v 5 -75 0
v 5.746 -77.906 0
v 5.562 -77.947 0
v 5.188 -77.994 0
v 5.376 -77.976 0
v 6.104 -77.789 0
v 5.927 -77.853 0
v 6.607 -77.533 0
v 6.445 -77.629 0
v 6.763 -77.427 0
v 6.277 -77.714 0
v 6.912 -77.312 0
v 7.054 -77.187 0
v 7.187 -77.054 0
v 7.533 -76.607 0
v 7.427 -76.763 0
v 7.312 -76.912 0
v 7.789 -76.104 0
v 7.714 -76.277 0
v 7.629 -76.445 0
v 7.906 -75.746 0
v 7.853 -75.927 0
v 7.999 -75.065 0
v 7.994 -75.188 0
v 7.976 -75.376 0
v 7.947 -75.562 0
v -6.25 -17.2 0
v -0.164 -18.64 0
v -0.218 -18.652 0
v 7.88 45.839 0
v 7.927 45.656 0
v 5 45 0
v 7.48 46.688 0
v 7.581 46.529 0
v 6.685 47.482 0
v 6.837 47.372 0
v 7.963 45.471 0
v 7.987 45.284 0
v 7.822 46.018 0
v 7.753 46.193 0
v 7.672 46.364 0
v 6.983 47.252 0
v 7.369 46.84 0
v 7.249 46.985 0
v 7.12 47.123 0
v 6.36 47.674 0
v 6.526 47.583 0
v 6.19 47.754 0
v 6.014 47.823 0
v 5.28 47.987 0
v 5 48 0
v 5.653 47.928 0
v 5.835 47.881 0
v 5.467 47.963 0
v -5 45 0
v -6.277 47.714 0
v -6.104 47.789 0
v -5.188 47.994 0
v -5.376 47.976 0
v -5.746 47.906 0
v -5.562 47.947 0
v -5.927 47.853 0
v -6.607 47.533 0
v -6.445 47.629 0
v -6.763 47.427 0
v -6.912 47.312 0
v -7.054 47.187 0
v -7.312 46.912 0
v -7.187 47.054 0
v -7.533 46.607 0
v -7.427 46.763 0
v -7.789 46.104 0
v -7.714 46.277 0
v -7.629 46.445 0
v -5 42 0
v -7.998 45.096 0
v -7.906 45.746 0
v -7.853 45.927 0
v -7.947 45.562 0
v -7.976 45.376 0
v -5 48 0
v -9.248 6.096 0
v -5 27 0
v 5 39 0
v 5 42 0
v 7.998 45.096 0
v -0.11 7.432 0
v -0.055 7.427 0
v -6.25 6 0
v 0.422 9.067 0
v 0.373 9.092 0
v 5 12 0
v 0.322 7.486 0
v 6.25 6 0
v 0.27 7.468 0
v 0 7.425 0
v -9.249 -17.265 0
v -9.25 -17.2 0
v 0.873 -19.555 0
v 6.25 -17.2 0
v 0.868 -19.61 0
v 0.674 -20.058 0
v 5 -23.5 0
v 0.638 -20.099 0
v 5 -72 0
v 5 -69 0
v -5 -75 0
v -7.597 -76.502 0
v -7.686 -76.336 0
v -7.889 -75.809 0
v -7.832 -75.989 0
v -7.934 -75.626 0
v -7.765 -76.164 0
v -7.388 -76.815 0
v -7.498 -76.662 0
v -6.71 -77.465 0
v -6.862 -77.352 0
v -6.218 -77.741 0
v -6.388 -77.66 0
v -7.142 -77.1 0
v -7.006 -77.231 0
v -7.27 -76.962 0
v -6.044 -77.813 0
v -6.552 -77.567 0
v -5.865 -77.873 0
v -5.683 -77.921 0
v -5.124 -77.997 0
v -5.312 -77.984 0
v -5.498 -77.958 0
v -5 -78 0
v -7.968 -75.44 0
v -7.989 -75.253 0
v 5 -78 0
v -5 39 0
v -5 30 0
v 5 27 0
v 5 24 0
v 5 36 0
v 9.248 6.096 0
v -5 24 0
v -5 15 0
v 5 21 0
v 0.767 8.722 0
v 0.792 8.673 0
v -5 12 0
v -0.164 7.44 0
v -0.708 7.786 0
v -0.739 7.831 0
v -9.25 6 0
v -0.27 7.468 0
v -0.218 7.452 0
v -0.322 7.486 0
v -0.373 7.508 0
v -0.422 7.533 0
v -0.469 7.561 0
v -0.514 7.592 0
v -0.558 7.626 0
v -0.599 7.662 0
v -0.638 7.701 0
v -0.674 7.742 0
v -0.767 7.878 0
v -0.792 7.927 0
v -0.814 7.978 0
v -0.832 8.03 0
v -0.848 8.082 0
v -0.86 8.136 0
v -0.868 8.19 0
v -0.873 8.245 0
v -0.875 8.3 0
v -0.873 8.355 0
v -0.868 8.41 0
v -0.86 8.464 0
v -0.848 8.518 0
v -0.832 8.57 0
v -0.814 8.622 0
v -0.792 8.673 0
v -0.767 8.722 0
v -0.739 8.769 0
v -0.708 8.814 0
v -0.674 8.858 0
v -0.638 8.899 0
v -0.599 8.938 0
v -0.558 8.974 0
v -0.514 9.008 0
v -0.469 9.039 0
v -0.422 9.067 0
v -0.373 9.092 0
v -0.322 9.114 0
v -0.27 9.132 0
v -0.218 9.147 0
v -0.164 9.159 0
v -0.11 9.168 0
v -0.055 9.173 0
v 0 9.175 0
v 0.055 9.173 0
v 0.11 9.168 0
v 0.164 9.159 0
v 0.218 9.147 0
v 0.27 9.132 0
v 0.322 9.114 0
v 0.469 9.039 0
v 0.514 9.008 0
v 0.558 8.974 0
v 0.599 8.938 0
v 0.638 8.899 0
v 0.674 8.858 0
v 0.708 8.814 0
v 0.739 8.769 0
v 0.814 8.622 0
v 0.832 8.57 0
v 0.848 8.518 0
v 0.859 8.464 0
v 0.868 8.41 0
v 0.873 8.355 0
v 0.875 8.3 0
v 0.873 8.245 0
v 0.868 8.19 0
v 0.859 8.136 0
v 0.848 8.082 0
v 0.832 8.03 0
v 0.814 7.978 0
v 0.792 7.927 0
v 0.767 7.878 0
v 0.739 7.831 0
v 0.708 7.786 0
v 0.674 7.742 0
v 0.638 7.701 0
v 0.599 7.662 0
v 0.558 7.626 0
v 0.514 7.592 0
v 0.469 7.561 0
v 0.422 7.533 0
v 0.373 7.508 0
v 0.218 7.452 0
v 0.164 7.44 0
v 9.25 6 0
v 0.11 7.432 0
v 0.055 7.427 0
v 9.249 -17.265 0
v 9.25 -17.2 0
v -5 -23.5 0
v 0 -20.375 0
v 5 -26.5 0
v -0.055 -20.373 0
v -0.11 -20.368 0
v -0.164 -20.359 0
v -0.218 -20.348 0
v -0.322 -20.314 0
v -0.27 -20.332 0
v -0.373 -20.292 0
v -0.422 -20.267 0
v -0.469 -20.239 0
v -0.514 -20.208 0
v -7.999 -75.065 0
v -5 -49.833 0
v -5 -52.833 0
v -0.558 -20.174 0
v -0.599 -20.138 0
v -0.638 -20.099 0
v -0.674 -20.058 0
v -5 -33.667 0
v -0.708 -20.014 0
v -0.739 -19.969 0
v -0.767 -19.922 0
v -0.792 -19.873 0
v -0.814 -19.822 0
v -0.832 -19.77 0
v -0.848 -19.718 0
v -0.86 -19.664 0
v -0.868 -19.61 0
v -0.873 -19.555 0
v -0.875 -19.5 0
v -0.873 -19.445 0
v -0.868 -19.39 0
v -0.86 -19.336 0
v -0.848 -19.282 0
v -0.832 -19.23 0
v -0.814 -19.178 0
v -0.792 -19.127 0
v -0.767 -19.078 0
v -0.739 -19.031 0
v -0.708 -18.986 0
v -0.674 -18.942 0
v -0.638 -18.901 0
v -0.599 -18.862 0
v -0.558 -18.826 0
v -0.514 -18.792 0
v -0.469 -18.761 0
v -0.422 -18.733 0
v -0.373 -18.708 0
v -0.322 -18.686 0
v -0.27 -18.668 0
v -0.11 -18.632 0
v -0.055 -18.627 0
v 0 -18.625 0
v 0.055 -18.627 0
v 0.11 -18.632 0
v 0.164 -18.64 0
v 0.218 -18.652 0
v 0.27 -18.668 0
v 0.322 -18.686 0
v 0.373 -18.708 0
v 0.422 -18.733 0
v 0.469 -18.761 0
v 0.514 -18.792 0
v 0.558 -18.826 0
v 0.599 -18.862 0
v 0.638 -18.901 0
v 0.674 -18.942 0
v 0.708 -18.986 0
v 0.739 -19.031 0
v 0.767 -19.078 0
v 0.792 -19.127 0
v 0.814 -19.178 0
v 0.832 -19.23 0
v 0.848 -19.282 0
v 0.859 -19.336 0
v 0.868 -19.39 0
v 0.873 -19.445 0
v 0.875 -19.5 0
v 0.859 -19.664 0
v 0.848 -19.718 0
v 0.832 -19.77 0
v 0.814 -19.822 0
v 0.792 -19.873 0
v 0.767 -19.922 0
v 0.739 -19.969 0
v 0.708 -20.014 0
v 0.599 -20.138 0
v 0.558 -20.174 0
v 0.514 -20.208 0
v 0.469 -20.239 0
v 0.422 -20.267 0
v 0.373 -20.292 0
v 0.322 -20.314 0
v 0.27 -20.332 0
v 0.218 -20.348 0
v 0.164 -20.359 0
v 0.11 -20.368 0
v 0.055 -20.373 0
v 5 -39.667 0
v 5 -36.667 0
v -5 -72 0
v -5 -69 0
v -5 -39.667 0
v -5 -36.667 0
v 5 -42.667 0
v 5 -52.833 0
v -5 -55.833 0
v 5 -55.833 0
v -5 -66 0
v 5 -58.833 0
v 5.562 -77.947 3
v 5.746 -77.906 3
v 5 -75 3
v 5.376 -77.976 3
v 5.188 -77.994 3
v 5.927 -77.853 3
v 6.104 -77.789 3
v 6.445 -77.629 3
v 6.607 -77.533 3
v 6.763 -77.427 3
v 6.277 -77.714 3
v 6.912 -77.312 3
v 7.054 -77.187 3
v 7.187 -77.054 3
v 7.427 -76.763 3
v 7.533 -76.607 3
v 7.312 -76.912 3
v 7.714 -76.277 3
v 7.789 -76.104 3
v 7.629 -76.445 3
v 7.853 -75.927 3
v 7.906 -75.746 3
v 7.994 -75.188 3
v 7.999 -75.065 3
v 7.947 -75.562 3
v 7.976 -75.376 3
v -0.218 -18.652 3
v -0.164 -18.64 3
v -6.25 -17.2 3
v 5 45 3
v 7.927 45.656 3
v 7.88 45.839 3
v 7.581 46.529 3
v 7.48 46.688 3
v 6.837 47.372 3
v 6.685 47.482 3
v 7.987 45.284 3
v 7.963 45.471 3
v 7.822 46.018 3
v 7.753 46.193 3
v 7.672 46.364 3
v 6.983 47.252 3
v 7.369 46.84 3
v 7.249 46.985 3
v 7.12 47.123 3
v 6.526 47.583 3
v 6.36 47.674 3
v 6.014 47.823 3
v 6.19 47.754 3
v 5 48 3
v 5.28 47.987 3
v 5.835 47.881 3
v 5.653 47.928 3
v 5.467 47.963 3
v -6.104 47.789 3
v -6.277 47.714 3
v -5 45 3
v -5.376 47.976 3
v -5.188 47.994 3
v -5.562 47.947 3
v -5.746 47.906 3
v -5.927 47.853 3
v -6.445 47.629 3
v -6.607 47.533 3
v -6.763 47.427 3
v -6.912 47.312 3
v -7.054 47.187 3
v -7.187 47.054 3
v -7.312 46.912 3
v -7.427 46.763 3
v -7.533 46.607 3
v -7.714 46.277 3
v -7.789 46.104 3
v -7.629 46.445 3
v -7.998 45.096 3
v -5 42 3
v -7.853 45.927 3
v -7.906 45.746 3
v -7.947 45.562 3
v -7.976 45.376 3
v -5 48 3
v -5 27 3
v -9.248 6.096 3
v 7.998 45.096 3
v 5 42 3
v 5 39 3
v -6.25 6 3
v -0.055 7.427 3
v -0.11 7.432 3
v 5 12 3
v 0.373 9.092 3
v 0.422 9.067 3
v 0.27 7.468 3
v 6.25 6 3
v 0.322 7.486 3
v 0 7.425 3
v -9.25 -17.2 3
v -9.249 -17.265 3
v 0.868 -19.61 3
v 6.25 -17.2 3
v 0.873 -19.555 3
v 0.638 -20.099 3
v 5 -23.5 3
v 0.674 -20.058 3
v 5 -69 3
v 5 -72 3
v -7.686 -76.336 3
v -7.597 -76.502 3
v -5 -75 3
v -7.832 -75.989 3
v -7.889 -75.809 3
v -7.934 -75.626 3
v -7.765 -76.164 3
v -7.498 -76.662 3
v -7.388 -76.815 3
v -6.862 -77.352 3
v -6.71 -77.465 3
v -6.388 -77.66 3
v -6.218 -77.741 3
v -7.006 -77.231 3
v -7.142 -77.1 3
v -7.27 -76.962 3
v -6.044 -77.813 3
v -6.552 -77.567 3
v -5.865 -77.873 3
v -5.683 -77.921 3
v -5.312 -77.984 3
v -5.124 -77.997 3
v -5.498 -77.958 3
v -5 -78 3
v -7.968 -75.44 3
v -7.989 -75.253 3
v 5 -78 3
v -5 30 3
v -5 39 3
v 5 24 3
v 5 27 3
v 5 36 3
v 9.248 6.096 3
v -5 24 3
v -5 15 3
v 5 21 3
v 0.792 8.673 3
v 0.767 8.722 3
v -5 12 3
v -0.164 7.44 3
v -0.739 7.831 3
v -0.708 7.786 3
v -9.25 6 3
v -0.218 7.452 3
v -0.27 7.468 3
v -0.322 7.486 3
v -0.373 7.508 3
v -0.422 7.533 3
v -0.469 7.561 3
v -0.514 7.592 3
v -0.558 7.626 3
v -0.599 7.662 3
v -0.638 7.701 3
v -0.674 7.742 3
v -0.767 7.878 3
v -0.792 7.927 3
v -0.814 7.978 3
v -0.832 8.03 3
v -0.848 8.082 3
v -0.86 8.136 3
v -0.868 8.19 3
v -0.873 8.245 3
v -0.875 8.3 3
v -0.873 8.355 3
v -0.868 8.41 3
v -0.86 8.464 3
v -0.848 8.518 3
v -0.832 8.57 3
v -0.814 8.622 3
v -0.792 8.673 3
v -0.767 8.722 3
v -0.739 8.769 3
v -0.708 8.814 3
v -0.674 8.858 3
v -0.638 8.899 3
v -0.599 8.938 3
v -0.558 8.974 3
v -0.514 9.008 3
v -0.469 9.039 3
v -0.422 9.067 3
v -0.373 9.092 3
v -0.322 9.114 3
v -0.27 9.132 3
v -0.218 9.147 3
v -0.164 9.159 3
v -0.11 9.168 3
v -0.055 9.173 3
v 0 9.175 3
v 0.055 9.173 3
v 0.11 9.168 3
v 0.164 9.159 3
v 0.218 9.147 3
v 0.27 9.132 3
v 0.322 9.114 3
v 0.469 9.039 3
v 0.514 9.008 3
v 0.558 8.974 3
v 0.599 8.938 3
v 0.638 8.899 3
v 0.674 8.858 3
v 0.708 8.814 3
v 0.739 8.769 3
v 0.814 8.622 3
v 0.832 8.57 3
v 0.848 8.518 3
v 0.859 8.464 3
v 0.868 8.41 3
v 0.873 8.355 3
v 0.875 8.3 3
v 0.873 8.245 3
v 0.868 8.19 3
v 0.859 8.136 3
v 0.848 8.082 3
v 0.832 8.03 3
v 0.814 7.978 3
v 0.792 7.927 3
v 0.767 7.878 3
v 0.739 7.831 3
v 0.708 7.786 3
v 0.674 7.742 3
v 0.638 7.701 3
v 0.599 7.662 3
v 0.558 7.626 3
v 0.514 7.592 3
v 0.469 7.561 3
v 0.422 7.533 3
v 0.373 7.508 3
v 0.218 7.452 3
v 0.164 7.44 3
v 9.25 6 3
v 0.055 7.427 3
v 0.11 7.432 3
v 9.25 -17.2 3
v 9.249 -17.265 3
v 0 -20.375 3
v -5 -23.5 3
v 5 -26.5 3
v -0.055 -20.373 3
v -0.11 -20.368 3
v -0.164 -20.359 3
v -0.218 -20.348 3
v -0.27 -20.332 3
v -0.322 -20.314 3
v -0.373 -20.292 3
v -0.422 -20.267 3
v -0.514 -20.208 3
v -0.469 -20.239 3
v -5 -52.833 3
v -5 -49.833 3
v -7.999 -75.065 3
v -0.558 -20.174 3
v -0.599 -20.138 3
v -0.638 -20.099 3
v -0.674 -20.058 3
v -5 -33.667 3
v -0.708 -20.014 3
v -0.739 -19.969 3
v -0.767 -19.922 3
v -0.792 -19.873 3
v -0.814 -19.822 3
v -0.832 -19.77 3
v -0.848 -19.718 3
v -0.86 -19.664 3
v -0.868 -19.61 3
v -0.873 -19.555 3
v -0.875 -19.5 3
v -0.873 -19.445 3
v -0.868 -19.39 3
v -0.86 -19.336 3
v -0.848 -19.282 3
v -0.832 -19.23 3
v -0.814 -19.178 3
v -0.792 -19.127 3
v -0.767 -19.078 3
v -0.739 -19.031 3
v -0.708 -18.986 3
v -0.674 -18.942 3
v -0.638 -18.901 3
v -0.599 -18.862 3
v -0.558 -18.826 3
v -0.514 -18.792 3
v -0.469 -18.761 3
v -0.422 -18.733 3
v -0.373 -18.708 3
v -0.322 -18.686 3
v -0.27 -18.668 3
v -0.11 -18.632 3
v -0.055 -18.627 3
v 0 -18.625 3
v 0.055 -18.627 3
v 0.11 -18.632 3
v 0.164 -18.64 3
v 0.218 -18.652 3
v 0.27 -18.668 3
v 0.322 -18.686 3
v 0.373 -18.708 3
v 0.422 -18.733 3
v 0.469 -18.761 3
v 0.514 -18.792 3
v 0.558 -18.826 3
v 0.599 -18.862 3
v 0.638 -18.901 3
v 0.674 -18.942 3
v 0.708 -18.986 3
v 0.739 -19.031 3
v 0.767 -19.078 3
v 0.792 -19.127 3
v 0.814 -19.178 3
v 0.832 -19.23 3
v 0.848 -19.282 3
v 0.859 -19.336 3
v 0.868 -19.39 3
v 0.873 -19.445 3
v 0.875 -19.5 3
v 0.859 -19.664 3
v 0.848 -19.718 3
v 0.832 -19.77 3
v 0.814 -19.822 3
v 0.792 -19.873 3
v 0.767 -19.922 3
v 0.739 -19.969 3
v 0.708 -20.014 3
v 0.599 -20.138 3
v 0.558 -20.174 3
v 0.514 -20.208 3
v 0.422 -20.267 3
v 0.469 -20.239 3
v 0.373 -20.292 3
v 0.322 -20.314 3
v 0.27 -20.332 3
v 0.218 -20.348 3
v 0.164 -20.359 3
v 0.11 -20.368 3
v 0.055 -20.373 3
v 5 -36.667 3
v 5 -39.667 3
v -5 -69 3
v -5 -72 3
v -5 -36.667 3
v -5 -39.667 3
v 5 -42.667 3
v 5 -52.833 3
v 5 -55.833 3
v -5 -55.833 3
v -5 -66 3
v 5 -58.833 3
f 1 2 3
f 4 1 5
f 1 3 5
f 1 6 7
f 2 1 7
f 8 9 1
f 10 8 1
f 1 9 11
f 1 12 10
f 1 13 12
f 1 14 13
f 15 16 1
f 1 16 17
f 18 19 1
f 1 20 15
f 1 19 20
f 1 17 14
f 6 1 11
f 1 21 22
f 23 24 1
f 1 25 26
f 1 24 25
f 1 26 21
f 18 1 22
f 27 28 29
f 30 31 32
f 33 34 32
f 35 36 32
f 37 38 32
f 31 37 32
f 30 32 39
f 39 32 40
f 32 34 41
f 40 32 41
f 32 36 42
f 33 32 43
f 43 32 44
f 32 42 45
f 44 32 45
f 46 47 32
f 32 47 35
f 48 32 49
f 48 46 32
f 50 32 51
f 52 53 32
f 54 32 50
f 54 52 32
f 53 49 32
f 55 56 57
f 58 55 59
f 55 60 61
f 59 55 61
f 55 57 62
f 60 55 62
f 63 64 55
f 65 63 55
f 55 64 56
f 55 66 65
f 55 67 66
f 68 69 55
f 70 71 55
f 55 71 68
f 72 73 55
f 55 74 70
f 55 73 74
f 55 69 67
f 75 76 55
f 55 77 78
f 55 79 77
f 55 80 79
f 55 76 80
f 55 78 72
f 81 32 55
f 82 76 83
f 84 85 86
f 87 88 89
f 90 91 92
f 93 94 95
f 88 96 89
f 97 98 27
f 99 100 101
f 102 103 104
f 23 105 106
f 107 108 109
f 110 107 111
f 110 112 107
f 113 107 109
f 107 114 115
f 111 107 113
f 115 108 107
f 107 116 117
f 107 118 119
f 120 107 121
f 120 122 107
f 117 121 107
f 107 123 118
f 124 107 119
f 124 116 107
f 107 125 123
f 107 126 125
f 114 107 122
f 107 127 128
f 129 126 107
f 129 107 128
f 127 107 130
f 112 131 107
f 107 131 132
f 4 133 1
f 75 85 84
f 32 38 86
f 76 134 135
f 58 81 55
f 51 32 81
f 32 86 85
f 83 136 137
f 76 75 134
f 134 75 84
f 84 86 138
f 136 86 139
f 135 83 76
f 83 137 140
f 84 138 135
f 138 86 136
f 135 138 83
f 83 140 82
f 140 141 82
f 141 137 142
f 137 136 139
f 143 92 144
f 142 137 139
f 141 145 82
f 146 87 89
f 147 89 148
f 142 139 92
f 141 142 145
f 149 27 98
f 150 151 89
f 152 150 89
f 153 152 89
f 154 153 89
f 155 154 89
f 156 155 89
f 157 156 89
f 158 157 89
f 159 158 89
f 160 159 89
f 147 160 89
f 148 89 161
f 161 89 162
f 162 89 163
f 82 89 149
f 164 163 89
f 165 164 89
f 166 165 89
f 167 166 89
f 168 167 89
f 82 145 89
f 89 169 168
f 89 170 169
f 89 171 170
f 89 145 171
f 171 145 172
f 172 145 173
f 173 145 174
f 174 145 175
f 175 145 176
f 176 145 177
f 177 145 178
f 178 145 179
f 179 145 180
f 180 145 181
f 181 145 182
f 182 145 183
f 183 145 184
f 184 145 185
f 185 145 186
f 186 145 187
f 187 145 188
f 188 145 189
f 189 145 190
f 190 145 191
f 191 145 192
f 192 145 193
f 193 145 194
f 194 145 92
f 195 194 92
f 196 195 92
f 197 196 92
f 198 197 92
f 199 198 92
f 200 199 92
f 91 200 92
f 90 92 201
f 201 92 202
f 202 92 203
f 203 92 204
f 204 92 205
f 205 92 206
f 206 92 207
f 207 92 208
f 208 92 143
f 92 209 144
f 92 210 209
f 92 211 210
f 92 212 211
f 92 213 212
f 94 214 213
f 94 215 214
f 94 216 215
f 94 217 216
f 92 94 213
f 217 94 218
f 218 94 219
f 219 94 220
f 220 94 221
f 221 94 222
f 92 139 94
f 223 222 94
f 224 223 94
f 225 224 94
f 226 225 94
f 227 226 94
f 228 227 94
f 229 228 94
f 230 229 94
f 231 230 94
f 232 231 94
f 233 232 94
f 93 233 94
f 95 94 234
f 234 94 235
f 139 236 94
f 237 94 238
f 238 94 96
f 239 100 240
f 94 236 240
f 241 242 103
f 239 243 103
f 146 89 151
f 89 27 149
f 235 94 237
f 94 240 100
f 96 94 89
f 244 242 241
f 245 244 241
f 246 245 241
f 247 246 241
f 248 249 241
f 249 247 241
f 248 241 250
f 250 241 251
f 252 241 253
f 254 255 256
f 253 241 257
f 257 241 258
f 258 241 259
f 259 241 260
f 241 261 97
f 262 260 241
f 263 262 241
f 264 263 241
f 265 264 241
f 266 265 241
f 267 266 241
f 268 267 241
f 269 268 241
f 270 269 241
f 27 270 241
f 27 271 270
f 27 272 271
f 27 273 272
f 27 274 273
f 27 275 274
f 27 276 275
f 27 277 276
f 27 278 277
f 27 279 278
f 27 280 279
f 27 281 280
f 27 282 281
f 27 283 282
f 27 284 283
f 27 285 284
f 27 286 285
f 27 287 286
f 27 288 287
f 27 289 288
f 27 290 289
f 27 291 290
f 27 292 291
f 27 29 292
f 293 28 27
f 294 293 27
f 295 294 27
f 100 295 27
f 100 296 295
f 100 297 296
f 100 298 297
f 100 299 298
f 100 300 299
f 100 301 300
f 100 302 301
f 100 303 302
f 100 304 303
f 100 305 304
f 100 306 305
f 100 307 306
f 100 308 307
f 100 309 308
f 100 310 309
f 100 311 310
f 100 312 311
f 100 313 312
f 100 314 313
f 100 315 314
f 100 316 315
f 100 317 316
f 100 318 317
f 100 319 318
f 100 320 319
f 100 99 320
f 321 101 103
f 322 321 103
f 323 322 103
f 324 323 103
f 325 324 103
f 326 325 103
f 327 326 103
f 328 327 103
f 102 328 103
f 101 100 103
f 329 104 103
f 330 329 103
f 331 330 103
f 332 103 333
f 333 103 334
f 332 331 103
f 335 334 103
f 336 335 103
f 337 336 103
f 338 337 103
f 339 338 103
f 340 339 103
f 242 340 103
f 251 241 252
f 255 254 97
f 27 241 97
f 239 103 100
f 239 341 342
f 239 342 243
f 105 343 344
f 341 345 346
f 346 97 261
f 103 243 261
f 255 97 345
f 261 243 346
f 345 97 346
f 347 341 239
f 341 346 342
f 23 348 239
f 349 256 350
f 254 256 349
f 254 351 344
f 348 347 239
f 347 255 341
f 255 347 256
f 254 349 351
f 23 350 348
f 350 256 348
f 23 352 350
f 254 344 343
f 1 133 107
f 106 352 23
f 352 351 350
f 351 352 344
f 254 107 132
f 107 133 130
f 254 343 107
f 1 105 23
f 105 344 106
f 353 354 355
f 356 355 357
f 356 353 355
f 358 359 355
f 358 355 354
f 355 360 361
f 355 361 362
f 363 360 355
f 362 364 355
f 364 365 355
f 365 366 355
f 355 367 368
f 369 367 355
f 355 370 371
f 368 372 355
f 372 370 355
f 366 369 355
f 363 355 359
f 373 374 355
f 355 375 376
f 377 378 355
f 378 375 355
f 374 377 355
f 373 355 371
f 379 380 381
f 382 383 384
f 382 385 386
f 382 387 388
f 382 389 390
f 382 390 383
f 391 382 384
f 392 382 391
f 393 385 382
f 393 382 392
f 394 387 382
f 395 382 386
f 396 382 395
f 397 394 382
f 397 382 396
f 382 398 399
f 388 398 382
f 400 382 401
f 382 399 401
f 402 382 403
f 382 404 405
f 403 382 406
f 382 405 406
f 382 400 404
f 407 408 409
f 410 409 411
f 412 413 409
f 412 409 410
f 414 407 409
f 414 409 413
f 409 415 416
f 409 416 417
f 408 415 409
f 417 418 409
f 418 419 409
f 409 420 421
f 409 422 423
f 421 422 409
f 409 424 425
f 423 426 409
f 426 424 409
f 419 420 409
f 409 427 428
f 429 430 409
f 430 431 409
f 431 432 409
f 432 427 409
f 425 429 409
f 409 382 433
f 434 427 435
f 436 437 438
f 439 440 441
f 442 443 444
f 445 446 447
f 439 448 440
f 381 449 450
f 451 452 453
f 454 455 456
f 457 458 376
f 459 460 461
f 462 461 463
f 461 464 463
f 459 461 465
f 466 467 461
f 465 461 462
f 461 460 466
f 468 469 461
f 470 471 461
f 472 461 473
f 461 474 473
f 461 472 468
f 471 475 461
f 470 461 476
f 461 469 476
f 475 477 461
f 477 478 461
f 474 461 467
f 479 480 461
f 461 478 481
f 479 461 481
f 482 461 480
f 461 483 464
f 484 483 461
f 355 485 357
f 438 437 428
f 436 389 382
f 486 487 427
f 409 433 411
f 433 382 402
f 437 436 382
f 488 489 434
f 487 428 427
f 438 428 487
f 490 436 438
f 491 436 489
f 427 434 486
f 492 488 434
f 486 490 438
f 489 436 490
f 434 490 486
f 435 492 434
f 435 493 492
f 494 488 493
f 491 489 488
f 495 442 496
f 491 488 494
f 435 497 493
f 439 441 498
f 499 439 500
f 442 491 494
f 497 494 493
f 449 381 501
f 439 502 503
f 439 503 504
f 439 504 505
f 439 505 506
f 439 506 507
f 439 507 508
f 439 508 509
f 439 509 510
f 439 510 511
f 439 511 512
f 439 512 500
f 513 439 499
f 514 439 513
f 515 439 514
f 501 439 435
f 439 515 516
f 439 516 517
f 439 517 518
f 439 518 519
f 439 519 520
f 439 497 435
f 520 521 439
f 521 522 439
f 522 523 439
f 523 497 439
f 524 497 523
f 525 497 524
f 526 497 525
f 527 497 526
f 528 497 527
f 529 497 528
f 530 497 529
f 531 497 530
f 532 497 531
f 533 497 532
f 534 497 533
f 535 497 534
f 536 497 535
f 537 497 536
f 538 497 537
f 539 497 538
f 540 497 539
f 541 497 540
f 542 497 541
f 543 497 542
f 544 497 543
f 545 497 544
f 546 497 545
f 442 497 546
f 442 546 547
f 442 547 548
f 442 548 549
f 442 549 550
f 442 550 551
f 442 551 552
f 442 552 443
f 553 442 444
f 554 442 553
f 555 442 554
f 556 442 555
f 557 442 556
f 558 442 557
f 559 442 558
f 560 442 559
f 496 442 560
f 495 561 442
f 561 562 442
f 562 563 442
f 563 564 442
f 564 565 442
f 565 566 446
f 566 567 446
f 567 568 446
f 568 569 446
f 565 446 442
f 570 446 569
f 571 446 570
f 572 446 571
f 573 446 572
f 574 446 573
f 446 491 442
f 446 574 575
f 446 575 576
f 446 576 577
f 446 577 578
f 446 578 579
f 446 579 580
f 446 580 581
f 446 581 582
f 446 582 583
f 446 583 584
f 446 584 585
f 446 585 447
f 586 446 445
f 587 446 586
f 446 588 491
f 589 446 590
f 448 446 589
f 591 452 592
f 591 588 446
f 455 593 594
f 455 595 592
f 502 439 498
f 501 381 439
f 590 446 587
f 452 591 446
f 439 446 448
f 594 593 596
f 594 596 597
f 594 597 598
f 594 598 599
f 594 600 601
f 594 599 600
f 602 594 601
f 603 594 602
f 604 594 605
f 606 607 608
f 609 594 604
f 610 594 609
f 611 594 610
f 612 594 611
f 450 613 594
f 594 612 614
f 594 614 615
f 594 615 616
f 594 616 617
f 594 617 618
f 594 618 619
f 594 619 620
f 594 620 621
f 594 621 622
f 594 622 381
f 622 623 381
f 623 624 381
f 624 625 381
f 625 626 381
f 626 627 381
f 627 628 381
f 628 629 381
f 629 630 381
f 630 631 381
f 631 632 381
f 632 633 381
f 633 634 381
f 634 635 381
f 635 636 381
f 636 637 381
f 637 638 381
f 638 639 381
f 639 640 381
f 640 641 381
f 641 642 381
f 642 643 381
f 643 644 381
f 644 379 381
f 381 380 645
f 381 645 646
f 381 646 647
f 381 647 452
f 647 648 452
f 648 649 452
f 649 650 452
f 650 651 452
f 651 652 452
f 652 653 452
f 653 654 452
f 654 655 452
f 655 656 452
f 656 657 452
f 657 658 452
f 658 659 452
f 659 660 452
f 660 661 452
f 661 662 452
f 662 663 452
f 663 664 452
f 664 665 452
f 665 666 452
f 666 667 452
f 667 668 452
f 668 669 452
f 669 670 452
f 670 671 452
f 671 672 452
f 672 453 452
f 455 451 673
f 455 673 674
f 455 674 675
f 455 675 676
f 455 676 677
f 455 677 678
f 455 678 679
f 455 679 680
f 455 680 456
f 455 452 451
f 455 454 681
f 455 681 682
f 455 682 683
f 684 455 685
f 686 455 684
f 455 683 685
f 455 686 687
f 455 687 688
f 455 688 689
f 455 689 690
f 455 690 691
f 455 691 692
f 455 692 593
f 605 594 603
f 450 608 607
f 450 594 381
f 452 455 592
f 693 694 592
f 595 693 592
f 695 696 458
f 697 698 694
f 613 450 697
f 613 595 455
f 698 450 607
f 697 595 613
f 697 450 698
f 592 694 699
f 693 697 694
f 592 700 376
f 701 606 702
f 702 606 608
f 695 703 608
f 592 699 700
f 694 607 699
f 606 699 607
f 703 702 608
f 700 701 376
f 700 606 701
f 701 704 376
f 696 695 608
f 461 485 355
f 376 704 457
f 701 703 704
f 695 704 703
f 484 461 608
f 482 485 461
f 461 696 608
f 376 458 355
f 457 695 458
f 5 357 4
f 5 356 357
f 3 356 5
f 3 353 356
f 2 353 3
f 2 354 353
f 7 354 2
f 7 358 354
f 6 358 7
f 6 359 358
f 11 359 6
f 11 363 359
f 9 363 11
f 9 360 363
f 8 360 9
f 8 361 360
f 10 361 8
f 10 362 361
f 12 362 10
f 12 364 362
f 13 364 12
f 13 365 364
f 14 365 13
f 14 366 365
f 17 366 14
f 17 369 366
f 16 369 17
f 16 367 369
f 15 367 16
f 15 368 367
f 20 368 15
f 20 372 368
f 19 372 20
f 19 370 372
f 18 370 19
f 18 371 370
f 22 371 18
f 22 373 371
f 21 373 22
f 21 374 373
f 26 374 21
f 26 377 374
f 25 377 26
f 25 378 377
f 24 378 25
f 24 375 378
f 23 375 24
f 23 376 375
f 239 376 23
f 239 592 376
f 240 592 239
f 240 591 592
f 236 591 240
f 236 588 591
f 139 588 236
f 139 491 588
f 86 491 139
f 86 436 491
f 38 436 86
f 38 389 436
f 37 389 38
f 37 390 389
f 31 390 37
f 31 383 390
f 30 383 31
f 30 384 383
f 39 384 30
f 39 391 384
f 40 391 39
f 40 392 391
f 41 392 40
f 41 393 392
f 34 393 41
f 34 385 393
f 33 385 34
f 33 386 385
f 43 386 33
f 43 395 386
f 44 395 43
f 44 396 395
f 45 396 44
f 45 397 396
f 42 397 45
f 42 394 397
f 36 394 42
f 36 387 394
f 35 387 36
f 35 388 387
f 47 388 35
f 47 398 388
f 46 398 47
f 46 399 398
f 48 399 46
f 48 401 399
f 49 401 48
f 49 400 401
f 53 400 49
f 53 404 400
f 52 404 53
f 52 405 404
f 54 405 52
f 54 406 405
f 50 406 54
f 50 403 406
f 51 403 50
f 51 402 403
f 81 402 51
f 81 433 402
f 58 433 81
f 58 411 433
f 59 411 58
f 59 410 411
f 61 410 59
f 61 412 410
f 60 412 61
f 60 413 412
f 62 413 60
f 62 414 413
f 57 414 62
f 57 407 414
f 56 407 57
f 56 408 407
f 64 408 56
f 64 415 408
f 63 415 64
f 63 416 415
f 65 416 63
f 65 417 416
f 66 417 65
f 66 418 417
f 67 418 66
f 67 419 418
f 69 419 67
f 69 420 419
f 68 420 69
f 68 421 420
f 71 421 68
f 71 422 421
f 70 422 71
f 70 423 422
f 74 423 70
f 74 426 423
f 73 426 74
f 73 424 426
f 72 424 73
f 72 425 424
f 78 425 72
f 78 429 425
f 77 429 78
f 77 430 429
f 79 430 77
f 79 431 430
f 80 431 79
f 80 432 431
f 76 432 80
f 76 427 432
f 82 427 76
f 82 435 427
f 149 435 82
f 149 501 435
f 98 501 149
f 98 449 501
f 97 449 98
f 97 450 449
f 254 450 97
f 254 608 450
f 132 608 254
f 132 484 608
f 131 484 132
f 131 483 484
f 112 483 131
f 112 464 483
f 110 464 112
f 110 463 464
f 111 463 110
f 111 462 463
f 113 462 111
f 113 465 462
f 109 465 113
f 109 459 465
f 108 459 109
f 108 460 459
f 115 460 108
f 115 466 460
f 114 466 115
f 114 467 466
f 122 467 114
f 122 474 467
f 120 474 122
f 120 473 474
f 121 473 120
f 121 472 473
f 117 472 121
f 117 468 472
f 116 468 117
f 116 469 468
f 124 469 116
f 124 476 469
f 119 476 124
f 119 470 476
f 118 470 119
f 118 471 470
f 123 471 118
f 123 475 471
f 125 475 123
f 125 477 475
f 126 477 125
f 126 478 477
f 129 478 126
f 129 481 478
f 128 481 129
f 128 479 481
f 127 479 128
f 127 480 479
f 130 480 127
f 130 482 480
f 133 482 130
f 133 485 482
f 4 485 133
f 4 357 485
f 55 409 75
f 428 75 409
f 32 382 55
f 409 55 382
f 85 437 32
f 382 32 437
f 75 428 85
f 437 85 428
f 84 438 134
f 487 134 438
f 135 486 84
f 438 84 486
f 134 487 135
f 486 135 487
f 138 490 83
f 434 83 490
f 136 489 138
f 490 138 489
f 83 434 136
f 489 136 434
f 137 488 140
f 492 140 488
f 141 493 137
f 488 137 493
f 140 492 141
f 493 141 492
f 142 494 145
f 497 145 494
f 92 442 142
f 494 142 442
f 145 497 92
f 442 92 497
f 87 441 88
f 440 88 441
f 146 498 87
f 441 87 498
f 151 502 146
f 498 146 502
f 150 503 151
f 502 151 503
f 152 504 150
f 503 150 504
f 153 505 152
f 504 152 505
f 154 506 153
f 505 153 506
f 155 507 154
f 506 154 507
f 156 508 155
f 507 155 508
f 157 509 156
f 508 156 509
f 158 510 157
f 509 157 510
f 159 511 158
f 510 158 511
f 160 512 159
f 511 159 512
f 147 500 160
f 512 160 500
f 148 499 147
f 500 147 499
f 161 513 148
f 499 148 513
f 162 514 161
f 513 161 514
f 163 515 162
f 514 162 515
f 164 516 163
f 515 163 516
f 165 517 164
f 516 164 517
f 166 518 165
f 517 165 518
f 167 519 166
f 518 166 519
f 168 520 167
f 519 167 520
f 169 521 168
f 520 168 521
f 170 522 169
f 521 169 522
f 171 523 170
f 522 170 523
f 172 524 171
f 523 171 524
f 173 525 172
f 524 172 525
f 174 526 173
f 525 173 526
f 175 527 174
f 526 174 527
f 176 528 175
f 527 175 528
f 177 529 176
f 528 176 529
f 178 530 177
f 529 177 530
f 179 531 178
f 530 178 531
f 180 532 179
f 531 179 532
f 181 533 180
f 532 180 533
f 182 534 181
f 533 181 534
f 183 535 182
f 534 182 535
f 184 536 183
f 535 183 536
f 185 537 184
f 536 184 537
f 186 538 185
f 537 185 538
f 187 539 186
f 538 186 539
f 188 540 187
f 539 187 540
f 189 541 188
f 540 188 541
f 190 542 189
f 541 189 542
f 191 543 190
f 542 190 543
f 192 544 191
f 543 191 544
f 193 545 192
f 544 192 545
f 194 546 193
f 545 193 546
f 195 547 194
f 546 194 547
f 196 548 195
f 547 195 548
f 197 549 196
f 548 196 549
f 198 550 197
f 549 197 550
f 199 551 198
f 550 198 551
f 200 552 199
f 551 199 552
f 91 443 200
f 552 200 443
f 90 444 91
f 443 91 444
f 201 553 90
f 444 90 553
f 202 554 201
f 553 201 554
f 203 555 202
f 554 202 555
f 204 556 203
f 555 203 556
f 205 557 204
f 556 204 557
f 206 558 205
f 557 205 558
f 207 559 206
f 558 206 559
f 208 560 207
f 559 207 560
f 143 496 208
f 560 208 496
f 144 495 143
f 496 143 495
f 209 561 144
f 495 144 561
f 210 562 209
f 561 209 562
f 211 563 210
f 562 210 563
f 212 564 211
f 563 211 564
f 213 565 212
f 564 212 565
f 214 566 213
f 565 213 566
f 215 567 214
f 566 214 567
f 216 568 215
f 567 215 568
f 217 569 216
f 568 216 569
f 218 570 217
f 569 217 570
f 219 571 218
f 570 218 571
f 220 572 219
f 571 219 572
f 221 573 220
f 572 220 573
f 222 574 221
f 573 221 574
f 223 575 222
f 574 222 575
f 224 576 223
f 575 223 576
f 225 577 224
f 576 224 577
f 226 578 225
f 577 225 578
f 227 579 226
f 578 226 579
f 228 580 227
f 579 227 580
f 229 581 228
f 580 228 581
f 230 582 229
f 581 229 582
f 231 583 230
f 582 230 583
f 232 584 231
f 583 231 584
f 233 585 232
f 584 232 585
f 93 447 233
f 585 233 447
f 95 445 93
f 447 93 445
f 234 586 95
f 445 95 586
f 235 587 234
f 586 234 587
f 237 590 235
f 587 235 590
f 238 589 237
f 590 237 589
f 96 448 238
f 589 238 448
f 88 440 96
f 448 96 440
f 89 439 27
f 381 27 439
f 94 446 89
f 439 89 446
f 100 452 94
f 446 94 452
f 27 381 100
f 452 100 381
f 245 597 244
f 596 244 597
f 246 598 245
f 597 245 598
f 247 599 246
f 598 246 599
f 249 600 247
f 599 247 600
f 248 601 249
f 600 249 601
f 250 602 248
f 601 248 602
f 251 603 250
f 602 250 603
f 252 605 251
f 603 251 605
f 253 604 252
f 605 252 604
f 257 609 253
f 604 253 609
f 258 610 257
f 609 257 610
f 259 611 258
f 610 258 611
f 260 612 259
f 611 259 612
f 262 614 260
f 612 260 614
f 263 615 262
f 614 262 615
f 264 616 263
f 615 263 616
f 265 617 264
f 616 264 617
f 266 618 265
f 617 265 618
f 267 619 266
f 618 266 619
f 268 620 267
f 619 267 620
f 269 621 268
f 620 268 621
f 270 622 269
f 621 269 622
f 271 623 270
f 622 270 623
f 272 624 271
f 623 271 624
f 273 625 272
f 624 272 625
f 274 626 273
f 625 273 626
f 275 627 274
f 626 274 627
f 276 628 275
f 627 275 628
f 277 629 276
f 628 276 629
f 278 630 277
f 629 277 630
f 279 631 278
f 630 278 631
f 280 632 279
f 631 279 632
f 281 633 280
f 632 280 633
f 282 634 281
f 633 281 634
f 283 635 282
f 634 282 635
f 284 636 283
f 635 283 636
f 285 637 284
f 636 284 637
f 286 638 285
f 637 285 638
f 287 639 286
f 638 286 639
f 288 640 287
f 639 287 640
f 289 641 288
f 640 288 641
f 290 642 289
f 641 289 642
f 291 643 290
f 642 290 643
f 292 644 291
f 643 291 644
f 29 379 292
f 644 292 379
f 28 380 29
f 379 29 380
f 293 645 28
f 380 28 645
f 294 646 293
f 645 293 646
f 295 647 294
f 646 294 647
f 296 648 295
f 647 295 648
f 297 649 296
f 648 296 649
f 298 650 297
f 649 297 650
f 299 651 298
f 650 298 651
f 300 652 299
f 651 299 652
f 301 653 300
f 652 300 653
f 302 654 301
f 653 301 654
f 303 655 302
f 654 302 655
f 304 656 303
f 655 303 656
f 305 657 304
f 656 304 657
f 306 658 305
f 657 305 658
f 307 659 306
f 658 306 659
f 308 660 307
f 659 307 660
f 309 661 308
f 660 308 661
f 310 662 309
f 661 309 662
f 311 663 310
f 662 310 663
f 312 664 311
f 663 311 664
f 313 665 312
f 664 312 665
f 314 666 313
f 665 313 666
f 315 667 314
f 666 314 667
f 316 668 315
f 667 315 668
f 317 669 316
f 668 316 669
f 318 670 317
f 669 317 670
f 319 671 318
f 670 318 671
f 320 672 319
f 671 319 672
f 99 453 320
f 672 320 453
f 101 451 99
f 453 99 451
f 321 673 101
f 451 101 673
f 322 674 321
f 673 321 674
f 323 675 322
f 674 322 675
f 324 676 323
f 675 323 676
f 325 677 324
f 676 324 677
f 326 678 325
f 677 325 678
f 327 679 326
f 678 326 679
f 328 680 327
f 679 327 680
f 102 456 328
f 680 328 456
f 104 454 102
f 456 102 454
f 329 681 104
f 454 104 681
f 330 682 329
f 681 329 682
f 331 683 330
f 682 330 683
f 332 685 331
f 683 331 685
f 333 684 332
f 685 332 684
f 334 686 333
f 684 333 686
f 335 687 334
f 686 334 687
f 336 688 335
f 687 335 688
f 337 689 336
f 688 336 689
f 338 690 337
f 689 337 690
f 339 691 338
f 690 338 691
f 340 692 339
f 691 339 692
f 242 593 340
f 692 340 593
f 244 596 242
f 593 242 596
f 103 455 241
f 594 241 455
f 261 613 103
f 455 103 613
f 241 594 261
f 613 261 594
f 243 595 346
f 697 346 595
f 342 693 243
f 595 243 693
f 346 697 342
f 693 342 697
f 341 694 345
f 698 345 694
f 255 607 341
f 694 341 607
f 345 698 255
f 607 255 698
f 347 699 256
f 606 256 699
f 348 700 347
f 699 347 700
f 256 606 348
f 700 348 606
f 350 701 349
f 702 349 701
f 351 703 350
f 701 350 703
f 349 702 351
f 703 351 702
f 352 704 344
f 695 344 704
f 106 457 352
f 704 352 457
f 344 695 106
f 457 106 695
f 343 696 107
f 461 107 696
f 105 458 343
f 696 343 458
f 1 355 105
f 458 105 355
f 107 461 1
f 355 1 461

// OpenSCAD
// file: gear.scad
// TODO: Screw mount is a bit too thick, cut another hole in it about halfway through
include <common.scad>;


// Servo head
module servo_arm() {
  tip_diameter = 3.75;
  base_diameter = 7;
  short_arm_length = 16.0;
  long_arm_length = 18.6;
  bar_length = 16.8;
  arm_thickness = 1.75;
  base_thickness = 4;
  screw_height = base_thickness + gear_thickness;
  screw_diam = 2.4;

  // origin is center of arm attachment (screw center, without base)
  union() {
    linear_extrude(height=arm_thickness, center=true){
      union() {
        // arm and center
        hull() {
          circle(d=base_diameter);
          translate([long_arm_length - tip_diameter / 2, 0])
            circle(d=tip_diameter);
          translate([-(short_arm_length - tip_diameter / 2), 0])
            circle(d=tip_diameter);
        }

        // short bar across
        hull() {
          translate([0, bar_length / 2 - tip_diameter / 2])
            circle(d=tip_diameter);
          translate([0, -(bar_length / 2 - tip_diameter / 2)])
            circle(d=tip_diameter);
        }
      }
    }
    translate([0, 0, -base_thickness + arm_thickness / 2]) {
      cylinder(d=base_diameter, h=base_thickness);
      cylinder(d=outer_diam(screw_diam), h=screw_height);
    }
  }
}

module servo_mount_mold_box() {
  difference() {
    translate([0, 0, 0.25])
      cube([38, 20, 2], center=true);
    servo_arm();
  }
}

module half_circle_rim(inner, outer) {
  difference() {
    circle(d=outer);
    circle(d=inner);
    translate([0, -outer/2])
      square([outer/2, outer]);
  }
}

module gear() {
  outer_diam = gear_diam + 2 * gear_spur_depth;
  inner_diam = gear_diam - 2 * gear_rim_width;

  difference() {
    union() {
      // half moon rim
      difference() {
        rotate_extrude(angle=180) {
          translate([inner_diam / 2, 0, 0])
            difference() {
              w = gear_rim_width + gear_spur_depth;
              h = gear_thickness;
              rt = h/6;
              square([w, h]);
              polygon([[w, rt], [w, h - rt], [w - gear_spur_depth, h/2 + rt/2], [w - gear_spur_depth, h/2 - rt/2]]);
            }
        }

        // cut off second half, as angle = 180 does not work in this version of openscad
        linear_extrude(height=gear_thickness)
          translate([gear_rim_width / 2, -outer_diam/2])
            square([outer_diam / 2, outer_diam]);
      }

      linear_extrude(height=gear_thickness) {
        // box that fits the servo mount
        resize([20, 40], center=true) circle(d=1);

        for (angle = [0, 60, 120, 180])
          rotate([0, 0, angle])
            translate([-gear_rim_width / 2, 0])
              square([gear_rim_width, gear_diam/2]);
      }
    }


    // servo arm mount cutout
    translate([0, 0, 1.75/2])
      rotate([0, 0, 90])
        servo_arm();

    // cable tie cutouts
    for(x = [-1, 1])
      for(y = [-1, 1])
        translate([x * 6, y * 6, 0])
          cylinder(d=outer_diam(3), h=gear_thickness);
  }
}

//rotate([180, 0 ,0])
  gear();
// servo_mount_mold_box();
// file: common.scad
$fn = 100;

function outer_diam(d, fn=$fn) = 1/cos(180/fn) * d;

// gear
gear_diam = 90;
gear_thickness = 4;
gear_spur_depth = 2;
gear_rim_width = 3;

// stand (vertical beam with servo mount)
gear_diameter = gear_diam;
body_length = 23.2;
body_width = 12.5;
body_height = 22.6;
mount_height = 2.8;
mount_offset = 21 - mount_height;
mount_length = 32.5;
gear_hood_diam = 12;
gear_hood_height = 5.7;
arm_spacing = 2.5;
mount_hole_diam = 1.75;
mount_hole_offset = (27.8 - body_length)/2;
stand_rim_width = 3;
stand_thickness = 3;
stand_height = 120;
stand_width = 10;
// main file
include <common.scad>;
use <gear.scad>;

$fn = 100;


module servo () {
  // origin is mounting point, center of gear attachment
  offset = [
    -(body_length - gear_hood_diam/2),
    -(body_width / 2),
    -(body_height + gear_hood_height + arm_spacing)
  ];

  translate(offset) {
    union() {
      cube([body_length, body_width, body_height]);
      translate([-(mount_length - body_length)/2, 0, mount_offset])
        cube([mount_length, body_width, mount_height]);
      translate([body_length - gear_hood_diam/2, body_width/2, body_height])
        cylinder(d=gear_hood_diam, h=gear_hood_height);
    }
  }
}

module example_gear_and_servo() {
  rotate([0, 0, 90])
    servo();
  gear();
}

module servo_mount_cutout() {
  translate([-body_width/2, -(body_length - gear_hood_diam /2)]) {
    square([body_width, body_length]);
    translate([body_width/2, -mount_hole_offset])
      circle(d=mount_hole_diam);
    translate([body_width/2, body_length+mount_hole_offset])
      circle(d=mount_hole_diam);
  }
}

rim_width = stand_rim_width;

module triangle_cutouts(n=1, length = stand_width + rim_width) {
  l = (length - (2*n - 1) * rim_width) / n;
  for(i = [0:1:n-1]) {
    translate([-stand_width / 2, i * (l + 2 * rim_width)]) {
      polygon([
        [0, 0],
        [stand_width, 0],
        [stand_width, l]]);
      polygon([
        [0, rim_width],
        [stand_width, rim_width + l],
        [0, rim_width + l]]);
    }
  }
}

module stand() {
  linear_extrude(height=stand_thickness){
    difference() {
      offset(r=rim_width) {
        hull() {
          servo_mount_cutout();
          translate([-stand_width/2, gear_diameter/2 - stand_height])
            square([stand_width, stand_height]);
        }
      }
      servo_mount_cutout();
      translate([-stand_width/2, gear_diameter/2 - rim_width])
        square([stand_width, stand_thickness]);
      translate([-stand_width/2, gear_diameter/2 - stand_height])
        square([stand_width, stand_thickness]);

      translate([0, gear_hood_diam]) {
        triangle_cutouts(n=2, length=gear_diameter / 2 - rim_width - stand_thickness - gear_hood_diam);
      }

      translate([0, -(stand_height - gear_diameter / 2) + stand_thickness + rim_width]) {
        triangle_cutouts(n=3, length=stand_height - gear_diameter/2 - 2 * rim_width - stand_thickness - mount_length + gear_hood_diam);
      }
    }
  }
}

stand();
